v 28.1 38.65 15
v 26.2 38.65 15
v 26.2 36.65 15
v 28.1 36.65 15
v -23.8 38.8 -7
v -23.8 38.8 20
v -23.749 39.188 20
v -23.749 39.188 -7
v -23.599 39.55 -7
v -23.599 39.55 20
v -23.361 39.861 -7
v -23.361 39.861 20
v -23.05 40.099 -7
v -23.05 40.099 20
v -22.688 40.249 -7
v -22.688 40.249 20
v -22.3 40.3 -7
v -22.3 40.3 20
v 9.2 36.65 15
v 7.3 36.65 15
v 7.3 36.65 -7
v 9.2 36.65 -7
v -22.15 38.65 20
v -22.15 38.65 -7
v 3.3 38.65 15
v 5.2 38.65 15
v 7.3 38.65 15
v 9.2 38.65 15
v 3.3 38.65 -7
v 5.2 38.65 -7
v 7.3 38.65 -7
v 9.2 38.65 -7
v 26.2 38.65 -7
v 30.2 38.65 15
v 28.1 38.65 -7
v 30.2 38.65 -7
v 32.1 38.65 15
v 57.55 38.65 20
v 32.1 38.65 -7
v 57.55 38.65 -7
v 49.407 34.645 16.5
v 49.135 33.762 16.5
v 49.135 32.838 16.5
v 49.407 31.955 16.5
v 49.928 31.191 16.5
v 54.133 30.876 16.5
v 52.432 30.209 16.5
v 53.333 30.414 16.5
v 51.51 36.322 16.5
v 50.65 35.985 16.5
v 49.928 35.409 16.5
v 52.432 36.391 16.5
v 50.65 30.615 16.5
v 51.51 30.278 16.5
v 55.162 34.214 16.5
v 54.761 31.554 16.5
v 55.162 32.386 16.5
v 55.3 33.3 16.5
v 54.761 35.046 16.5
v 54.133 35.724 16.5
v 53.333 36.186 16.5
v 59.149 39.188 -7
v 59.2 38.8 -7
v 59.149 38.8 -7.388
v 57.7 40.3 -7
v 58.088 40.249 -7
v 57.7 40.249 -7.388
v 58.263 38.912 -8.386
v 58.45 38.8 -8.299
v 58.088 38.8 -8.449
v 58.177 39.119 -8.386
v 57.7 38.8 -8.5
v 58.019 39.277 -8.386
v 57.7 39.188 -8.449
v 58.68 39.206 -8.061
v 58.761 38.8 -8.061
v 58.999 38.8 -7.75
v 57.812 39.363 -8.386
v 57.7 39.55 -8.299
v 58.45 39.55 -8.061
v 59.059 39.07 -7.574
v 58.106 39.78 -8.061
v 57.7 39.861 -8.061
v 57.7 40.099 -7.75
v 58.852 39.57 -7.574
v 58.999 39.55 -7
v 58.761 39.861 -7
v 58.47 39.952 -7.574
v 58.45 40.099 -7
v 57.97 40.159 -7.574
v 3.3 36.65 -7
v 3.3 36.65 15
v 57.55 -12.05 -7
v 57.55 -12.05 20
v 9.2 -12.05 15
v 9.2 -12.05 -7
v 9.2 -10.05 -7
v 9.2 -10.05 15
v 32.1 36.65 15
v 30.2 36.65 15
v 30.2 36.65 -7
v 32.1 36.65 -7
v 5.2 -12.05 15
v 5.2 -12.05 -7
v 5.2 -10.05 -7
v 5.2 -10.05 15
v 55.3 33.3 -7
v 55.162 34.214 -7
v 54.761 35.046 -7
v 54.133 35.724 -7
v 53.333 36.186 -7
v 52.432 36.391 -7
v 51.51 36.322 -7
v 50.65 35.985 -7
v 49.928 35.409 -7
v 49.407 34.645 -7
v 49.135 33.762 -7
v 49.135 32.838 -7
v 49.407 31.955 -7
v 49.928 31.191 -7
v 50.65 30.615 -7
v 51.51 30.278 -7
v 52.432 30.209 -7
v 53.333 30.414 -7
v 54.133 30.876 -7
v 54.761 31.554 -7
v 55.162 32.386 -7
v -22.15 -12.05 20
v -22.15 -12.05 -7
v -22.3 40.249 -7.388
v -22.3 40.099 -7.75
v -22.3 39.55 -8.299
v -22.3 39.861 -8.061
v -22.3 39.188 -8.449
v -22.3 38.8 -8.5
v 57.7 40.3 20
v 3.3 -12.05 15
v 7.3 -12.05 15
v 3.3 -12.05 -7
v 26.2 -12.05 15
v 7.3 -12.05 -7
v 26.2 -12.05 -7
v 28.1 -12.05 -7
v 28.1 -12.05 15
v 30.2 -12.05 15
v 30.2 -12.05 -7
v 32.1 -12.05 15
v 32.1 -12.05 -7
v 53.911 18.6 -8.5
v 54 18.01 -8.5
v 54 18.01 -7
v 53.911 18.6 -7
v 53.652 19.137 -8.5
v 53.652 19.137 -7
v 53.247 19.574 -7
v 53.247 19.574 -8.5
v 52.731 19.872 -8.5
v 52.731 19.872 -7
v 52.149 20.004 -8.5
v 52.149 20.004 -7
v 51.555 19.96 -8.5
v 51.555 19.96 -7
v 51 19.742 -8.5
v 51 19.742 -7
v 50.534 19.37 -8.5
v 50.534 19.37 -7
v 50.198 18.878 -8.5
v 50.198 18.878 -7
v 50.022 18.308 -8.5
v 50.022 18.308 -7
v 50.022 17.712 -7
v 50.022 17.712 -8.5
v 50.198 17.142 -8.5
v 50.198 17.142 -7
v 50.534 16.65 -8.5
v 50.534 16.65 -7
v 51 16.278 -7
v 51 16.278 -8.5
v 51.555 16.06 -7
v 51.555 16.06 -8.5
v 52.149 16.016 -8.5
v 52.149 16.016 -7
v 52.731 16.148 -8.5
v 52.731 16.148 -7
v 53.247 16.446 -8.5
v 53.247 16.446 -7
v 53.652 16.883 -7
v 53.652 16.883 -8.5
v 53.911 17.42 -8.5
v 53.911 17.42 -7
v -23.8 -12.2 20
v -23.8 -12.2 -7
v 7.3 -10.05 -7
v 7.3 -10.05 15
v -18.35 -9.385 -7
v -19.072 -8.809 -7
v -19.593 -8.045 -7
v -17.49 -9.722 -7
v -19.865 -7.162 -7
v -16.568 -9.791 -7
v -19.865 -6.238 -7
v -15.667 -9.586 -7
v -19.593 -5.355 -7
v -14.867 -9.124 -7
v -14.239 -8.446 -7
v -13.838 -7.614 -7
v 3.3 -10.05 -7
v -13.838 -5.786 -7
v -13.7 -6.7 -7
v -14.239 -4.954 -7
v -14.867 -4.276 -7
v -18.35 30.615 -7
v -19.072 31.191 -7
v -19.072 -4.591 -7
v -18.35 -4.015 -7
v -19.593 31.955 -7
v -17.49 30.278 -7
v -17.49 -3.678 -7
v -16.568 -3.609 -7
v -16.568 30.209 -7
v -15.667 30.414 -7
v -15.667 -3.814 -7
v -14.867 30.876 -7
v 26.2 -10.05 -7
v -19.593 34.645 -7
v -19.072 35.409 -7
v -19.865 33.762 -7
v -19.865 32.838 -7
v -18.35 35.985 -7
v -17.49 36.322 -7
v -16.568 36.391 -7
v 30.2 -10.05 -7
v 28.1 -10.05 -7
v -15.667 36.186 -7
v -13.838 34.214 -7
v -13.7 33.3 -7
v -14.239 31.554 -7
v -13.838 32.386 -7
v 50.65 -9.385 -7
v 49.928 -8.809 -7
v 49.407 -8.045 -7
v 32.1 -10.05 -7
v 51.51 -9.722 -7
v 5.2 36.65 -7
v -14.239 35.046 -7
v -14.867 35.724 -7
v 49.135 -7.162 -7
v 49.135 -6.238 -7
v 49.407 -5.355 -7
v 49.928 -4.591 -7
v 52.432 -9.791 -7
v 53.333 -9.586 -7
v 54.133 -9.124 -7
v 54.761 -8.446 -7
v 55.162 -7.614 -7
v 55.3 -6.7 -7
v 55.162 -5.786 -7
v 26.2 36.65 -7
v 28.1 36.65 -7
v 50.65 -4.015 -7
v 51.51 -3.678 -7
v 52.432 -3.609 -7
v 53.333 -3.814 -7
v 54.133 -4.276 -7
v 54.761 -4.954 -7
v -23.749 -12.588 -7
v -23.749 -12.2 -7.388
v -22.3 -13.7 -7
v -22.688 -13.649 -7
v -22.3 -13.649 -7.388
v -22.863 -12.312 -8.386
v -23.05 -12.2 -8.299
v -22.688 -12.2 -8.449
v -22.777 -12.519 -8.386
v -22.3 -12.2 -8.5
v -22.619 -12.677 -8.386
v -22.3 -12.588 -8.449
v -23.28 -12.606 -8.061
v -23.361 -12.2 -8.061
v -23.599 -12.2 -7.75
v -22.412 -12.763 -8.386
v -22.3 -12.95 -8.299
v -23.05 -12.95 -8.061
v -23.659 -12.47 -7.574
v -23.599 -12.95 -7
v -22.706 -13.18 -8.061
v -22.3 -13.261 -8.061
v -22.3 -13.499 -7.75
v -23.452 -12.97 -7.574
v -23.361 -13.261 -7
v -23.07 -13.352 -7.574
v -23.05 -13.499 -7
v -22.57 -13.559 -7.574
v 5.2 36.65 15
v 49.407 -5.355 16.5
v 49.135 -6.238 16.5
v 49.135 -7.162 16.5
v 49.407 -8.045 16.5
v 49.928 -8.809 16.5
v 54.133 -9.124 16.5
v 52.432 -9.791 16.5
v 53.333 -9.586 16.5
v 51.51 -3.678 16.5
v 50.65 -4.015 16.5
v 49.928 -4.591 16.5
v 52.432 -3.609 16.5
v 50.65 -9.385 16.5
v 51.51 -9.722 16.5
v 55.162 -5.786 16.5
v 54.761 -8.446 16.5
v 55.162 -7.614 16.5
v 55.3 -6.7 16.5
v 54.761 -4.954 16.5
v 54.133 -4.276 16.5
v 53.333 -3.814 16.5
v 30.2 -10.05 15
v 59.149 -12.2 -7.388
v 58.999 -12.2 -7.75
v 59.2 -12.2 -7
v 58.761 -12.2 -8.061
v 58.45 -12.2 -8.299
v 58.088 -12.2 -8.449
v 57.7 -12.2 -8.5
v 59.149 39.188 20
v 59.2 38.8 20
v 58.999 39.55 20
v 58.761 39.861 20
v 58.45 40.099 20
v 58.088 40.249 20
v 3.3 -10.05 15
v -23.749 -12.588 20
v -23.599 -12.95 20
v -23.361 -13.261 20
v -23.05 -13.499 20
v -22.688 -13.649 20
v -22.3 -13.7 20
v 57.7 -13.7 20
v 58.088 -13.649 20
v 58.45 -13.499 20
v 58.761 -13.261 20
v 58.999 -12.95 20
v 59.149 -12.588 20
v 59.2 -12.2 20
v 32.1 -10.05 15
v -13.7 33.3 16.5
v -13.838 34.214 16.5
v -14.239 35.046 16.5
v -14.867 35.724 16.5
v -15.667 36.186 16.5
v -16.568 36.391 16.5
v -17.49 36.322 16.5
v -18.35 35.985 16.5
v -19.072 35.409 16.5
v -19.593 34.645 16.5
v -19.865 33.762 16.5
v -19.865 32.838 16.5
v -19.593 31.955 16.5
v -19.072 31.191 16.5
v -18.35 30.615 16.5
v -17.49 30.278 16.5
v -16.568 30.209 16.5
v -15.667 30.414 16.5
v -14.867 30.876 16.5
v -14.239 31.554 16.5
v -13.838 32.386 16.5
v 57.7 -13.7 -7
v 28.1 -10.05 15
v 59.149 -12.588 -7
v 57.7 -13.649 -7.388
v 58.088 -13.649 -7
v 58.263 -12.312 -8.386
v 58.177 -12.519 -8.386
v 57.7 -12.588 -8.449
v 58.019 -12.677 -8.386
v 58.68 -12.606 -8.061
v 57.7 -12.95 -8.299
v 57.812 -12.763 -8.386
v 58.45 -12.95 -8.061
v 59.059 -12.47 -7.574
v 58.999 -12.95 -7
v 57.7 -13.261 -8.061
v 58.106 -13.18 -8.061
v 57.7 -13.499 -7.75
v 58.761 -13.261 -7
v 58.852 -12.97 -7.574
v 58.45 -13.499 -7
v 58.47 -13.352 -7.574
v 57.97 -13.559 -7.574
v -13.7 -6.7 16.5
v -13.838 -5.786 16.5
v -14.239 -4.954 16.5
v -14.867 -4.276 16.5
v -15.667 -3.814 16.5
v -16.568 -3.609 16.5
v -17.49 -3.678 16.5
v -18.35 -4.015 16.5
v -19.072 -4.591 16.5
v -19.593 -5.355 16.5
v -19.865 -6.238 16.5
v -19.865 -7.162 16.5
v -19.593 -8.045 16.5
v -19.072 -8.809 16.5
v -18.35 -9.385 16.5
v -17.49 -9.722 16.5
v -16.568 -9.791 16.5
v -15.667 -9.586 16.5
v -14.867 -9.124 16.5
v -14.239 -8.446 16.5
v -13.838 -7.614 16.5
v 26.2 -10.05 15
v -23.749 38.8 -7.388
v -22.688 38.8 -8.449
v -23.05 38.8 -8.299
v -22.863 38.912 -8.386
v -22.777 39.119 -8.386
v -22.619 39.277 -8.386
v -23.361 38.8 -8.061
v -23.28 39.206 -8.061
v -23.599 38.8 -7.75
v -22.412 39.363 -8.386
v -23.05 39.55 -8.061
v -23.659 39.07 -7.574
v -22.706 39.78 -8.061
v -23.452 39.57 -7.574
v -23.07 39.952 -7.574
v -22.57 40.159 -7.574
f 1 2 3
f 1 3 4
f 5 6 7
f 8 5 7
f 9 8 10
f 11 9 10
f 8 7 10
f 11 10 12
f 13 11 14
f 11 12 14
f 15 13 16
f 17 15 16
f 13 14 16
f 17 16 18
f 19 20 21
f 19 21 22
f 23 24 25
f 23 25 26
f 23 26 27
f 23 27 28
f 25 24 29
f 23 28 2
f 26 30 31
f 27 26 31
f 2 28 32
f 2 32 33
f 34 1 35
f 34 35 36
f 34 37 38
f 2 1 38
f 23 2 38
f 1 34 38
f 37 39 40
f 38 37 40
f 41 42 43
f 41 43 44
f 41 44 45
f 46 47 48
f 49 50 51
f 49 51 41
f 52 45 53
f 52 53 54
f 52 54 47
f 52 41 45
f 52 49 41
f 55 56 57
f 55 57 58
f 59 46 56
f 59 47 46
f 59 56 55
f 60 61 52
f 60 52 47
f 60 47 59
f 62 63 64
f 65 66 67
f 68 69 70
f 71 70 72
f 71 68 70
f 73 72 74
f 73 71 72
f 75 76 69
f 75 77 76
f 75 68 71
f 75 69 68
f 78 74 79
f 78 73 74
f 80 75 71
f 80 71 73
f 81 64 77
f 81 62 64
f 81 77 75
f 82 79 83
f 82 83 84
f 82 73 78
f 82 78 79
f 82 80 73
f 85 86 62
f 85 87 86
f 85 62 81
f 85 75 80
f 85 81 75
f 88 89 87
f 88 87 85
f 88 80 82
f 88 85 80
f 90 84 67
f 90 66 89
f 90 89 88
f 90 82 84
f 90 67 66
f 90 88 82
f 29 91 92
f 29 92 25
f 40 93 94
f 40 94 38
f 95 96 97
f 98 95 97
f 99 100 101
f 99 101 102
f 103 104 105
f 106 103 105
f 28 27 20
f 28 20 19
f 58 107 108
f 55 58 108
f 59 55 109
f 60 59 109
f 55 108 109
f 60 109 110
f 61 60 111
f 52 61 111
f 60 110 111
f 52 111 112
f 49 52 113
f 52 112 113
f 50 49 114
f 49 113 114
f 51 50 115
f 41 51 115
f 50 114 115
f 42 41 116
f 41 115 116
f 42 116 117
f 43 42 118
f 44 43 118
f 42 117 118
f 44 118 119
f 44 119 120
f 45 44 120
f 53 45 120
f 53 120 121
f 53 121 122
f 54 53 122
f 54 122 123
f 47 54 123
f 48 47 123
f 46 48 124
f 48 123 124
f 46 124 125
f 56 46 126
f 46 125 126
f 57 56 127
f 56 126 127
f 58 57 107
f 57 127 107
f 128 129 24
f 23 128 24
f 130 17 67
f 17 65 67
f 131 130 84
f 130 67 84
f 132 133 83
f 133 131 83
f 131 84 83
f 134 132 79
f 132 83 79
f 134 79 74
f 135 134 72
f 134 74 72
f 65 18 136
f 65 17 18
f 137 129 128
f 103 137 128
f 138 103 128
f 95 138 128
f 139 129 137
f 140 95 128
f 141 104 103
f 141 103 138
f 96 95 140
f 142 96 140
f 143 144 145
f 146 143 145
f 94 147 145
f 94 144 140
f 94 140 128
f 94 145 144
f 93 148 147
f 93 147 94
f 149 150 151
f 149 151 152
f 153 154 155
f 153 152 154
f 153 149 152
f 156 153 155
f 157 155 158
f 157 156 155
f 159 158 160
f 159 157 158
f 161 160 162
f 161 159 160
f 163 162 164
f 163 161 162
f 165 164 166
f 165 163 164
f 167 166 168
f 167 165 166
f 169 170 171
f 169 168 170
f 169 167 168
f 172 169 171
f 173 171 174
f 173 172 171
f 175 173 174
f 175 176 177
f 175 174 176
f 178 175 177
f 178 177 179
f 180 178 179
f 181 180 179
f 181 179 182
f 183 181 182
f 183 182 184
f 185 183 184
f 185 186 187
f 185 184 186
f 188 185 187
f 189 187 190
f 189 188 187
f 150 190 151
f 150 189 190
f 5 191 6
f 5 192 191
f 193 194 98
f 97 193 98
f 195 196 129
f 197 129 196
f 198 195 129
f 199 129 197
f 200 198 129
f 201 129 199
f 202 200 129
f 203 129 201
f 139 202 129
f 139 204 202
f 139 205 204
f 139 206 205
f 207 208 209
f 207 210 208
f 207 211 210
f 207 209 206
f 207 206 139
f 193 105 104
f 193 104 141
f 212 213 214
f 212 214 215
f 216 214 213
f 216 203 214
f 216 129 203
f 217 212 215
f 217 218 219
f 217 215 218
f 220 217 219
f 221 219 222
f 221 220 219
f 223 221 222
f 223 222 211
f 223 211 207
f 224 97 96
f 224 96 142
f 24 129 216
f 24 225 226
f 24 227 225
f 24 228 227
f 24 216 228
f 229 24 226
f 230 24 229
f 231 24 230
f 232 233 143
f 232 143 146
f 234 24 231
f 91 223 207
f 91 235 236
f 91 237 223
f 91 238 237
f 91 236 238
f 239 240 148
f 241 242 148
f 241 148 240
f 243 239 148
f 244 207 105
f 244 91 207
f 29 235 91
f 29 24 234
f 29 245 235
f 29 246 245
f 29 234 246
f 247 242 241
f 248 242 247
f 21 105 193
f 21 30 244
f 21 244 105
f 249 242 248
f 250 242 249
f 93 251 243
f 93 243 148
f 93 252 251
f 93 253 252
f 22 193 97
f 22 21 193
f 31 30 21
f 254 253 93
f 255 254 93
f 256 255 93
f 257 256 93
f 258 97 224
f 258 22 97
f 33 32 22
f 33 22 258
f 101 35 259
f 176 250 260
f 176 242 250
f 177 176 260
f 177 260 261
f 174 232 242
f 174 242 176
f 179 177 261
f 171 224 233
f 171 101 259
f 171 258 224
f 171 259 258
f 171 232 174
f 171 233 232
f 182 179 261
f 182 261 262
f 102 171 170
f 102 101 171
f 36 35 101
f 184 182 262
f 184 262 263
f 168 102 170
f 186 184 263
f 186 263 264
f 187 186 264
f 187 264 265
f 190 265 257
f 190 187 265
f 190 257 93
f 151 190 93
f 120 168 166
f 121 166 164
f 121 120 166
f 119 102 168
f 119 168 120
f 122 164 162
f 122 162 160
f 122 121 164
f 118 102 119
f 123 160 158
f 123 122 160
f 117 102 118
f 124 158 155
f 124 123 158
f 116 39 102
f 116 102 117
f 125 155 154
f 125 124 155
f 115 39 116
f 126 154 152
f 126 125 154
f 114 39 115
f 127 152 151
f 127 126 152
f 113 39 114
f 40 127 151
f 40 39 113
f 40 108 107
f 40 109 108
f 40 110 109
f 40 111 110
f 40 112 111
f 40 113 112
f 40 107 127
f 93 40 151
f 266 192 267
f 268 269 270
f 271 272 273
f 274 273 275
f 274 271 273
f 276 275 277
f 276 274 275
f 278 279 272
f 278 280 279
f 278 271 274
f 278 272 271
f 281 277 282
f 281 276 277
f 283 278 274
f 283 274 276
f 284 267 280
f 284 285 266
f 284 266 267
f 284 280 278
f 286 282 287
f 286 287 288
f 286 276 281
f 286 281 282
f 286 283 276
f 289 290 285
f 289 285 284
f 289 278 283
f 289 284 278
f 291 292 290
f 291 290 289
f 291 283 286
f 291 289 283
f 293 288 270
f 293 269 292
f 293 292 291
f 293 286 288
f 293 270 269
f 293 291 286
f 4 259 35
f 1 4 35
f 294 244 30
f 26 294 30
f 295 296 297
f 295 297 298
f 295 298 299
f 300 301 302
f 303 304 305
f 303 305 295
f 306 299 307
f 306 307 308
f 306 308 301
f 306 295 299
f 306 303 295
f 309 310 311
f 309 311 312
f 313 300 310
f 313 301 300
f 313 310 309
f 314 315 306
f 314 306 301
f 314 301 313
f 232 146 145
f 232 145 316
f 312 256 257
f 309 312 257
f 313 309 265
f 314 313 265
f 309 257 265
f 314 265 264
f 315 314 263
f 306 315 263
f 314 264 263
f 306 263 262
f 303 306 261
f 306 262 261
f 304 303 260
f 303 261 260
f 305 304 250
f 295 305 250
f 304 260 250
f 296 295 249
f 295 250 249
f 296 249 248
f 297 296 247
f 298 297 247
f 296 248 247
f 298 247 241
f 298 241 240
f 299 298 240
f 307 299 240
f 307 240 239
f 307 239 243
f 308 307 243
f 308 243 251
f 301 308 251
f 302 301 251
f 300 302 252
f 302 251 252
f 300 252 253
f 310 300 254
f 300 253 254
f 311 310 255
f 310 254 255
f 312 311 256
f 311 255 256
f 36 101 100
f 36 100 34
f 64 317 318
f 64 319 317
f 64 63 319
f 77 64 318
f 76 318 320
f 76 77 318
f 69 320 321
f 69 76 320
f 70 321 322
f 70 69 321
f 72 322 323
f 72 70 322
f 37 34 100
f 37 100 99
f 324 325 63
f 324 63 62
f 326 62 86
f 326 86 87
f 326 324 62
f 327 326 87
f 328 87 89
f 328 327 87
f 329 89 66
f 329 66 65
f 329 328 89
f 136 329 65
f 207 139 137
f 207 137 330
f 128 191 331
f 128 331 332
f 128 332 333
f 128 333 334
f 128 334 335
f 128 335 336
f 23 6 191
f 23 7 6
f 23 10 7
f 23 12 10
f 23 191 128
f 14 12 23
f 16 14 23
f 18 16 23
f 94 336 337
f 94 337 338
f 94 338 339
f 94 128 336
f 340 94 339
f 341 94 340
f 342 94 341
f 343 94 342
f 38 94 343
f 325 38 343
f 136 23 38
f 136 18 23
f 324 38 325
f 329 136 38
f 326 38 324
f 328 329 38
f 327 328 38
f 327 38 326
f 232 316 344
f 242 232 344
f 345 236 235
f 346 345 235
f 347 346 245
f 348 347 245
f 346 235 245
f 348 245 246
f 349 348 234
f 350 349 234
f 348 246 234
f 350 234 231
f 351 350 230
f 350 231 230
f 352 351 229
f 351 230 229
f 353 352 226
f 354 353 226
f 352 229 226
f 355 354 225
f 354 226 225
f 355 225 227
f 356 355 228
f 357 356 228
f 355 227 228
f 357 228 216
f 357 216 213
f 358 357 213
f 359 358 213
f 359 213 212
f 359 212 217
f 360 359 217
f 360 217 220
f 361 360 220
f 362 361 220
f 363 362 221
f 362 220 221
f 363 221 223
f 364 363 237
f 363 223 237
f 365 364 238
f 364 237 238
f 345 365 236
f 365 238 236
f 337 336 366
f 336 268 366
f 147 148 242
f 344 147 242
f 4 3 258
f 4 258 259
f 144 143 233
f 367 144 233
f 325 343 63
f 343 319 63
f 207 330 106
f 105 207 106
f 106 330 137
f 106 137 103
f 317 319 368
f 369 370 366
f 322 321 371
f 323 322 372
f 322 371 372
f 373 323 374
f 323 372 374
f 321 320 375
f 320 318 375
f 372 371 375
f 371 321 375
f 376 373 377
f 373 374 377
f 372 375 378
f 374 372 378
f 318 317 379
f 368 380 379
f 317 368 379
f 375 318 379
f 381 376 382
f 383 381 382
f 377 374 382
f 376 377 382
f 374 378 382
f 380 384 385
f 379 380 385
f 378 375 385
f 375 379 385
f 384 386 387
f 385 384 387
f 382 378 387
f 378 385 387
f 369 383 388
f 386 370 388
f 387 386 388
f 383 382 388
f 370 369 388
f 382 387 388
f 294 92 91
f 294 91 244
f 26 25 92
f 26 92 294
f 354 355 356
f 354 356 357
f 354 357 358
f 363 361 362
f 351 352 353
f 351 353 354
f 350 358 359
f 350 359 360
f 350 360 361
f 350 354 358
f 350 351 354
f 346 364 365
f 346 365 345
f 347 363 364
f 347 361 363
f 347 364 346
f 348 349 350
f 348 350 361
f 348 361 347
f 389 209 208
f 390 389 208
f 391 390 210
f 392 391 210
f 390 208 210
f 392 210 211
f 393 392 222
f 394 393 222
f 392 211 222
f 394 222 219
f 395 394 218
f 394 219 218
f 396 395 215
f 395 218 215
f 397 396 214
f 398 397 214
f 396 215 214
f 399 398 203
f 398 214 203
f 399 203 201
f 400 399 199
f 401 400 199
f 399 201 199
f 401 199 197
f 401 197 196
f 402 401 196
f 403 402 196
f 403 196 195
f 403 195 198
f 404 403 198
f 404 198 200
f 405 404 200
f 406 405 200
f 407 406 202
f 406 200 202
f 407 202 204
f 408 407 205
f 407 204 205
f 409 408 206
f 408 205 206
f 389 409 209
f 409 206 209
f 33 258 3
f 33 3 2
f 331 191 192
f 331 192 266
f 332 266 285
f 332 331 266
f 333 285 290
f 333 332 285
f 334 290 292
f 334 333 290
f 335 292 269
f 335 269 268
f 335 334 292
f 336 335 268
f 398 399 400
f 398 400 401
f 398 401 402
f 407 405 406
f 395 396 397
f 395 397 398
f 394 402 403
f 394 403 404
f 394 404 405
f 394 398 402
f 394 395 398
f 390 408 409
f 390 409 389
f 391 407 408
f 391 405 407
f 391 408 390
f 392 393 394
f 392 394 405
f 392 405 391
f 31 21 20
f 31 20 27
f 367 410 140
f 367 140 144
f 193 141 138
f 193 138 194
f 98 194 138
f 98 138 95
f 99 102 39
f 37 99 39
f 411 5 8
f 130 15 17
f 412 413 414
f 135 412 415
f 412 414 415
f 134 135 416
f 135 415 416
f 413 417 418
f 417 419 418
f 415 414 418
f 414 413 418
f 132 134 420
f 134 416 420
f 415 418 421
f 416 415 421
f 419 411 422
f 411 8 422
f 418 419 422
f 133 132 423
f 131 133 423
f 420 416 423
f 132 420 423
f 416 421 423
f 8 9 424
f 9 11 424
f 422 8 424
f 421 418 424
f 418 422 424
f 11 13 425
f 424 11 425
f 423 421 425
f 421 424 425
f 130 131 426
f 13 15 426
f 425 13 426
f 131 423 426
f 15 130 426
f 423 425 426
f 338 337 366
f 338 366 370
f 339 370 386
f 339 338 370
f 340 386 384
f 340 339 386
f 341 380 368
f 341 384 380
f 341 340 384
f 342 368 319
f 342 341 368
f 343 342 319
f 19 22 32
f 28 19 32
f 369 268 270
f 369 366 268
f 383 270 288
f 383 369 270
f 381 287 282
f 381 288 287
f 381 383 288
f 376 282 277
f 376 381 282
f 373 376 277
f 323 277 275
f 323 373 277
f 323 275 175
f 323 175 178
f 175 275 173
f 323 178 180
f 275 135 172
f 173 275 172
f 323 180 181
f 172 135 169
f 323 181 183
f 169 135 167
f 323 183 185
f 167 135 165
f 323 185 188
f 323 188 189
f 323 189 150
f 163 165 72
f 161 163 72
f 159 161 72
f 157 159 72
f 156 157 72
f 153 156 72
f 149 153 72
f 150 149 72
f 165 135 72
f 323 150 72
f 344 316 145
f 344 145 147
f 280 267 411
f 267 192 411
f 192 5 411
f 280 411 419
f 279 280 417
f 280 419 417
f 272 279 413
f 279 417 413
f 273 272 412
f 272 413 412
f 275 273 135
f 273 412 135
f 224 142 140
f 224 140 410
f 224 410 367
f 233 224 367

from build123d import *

# Parameters (mm, degrees)
CYLINDER040_R     = 2
CYLINDER040_DEPTH = 10
CYLINDER038_R     = 3.1
CYLINDER038_DEPTH = 23.5
BOX010_W          = 1.9
BOX010_H          = 2
BOX010_DEPTH      = 22
BOX009_W          = 79.7
BOX009_H          = 50.7
BOX009_DEPTH      = 27
BOX008_W          = 83
BOX008_H          = 54
BOX008_DEPTH      = 28.5
FILLET_R          = 1.5


with BuildPart() as led_hole:
    # Cylinder040 → Cylinder040 (new body)
    with BuildSketch(Plane(origin=(52, 18.01, -10), x_dir=(1, 0, 0), z_dir=(0, 0, 1))):
        Circle(CYLINDER040_R)
    extrude(amount=CYLINDER040_DEPTH)


with BuildPart() as lid_col:
    # Cylinder038 → Cylinder038 (new body)
    with BuildSketch(Plane(origin=(7, 7, 1.5), x_dir=(1, 0, 0), z_dir=(0, 0, 1))):
        Circle(CYLINDER038_R)
    extrude(amount=CYLINDER038_DEPTH)


with BuildPart() as lid_col001:
    # Clone010 base: copy of lid-col
    add(lid_col.part)


with BuildPart() as lid_col001_1:
    # Clone010 placement: moved
    add(lid_col001.part.moved(Location((0, 40, 0))))


with BuildPart() as lid_col002:
    # Clone011 base: copy of lid-col
    add(lid_col.part)


with BuildPart() as lid_col002_1:
    # Clone011 placement: moved
    add(lid_col002.part.moved(Location((69, 0, 0))))


with BuildPart() as lid_col003:
    # Clone012 base: copy of lid-col
    add(lid_col.part)


with BuildPart() as lid_col003_1:
    # Clone012 placement: moved
    add(lid_col003.part.moved(Location((69, 40, 0))))


with BuildPart() as lid_pin:
    # Box010 → Box010 (new body)
    with BuildSketch(Plane(origin=(50, 50.35, 1.5), x_dir=(1, 0, 0), z_dir=(0, 0, 1))):
        with Locations((0.95, 1)):
            Rectangle(BOX010_W, BOX010_H)
    extrude(amount=BOX010_DEPTH)


with BuildPart() as lid_pin001:
    # Clone003 base: copy of lid-pin
    add(lid_pin.part)


with BuildPart() as lid_pin001_1:
    # Clone003 placement: moved
    add(lid_pin001.part.moved(Location((4, 0, 0))))


with BuildPart() as lid_pin002:
    # Clone004 base: copy of lid-pin
    add(lid_pin.part)


with BuildPart() as lid_pin002_1:
    # Clone004 placement: moved
    add(lid_pin002.part.moved(Location((-18.9, 0, 0))))


with BuildPart() as lid_pin003:
    # Clone005 base: copy of lid-pin
    add(lid_pin.part)


with BuildPart() as lid_pin003_1:
    # Clone005 placement: moved
    add(lid_pin003.part.moved(Location((-22.9, 0, 0))))


with BuildPart() as lid_pin004:
    # Clone006 base: copy of lid-pin
    add(lid_pin.part)


with BuildPart() as lid_pin004_1:
    # Clone006 placement: moved
    add(lid_pin004.part.moved(Location((0, -48.7, 0))))


with BuildPart() as lid_pin005:
    # Clone007 base: copy of lid-pin
    add(lid_pin.part)


with BuildPart() as lid_pin005_1:
    # Clone007 placement: moved
    add(lid_pin005.part.moved(Location((4, -48.7, 0))))


with BuildPart() as lid_pin006:
    # Clone008 base: copy of lid-pin
    add(lid_pin.part)


with BuildPart() as lid_pin006_1:
    # Clone008 placement: moved
    add(lid_pin006.part.moved(Location((-18.9, -48.7, 0))))


with BuildPart() as lid_pin007:
    # Clone009 base: copy of lid-pin
    add(lid_pin.part)


with BuildPart() as lid_pin007_1:
    # Clone009 placement: moved
    add(lid_pin007.part.moved(Location((-22.9, -48.7, 0))))


with BuildPart() as cube009:
    # Box009 → Box009 (new body)
    with BuildSketch(Plane(origin=(1.65, 1.65, 1.5), x_dir=(1, 0, 0), z_dir=(0, 0, 1))):
        with Locations((39.85, 25.35)):
            Rectangle(BOX009_W, BOX009_H)
    extrude(amount=BOX009_DEPTH)


with BuildPart() as g1020bf_top_lid:
    # Box008 → Box008 (new body)
    with BuildSketch(Plane.XY):
        with Locations((41.5, 27)):
            Rectangle(BOX008_W, BOX008_H)
    extrude(amount=BOX008_DEPTH)

    # Fillet
    fillet_edges = [g1020bf_top_lid.edges().sort_by_distance(p)[0] for p in [
        (0, 0, 14.25),
        (0, 54, 14.25),
        (0, 27, 0),
        (83, 0, 14.25),
        (83, 54, 14.25),
        (83, 27, 0),
        (41.5, 0, 0),
        (41.5, 54, 0),
    ]]
    fillet(fillet_edges, radius=FILLET_R)

    # Cut005: cut Cube009
    add(cube009.part, mode=Mode.SUBTRACT)

    # Fusion002: union lid-pin
    add(lid_pin.part)

    # Fusion003: union lid-pin007
    add(lid_pin007_1.part)

    # Fusion004: union lid-pin006
    add(lid_pin006_1.part)

    # Fusion005: union lid-pin005
    add(lid_pin005_1.part)

    # Fusion006: union lid-pin004
    add(lid_pin004_1.part)

    # Fusion007: union lid-pin003
    add(lid_pin003_1.part)

    # Fusion008: union lid-pin002
    add(lid_pin002_1.part)

    # Fusion009: union lid-pin001
    add(lid_pin001_1.part)

    # Fusion010: union lid-col
    add(lid_col.part)

    # Fusion011: union lid-col003
    add(lid_col003_1.part)

    # Fusion012: union lid-col002
    add(lid_col002_1.part)

    # Fusion013: union lid-col001
    add(lid_col001_1.part)


with BuildPart() as g1020bf_top_lid_1:
    # Fusion013 placement: moved
    add(g1020bf_top_lid.part.moved(Location((-23.8, -13.7, -8.5))))

    # Cut007: cut led-hole
    add(led_hole.part, mode=Mode.SUBTRACT)


solid = g1020bf_top_lid_1.part
